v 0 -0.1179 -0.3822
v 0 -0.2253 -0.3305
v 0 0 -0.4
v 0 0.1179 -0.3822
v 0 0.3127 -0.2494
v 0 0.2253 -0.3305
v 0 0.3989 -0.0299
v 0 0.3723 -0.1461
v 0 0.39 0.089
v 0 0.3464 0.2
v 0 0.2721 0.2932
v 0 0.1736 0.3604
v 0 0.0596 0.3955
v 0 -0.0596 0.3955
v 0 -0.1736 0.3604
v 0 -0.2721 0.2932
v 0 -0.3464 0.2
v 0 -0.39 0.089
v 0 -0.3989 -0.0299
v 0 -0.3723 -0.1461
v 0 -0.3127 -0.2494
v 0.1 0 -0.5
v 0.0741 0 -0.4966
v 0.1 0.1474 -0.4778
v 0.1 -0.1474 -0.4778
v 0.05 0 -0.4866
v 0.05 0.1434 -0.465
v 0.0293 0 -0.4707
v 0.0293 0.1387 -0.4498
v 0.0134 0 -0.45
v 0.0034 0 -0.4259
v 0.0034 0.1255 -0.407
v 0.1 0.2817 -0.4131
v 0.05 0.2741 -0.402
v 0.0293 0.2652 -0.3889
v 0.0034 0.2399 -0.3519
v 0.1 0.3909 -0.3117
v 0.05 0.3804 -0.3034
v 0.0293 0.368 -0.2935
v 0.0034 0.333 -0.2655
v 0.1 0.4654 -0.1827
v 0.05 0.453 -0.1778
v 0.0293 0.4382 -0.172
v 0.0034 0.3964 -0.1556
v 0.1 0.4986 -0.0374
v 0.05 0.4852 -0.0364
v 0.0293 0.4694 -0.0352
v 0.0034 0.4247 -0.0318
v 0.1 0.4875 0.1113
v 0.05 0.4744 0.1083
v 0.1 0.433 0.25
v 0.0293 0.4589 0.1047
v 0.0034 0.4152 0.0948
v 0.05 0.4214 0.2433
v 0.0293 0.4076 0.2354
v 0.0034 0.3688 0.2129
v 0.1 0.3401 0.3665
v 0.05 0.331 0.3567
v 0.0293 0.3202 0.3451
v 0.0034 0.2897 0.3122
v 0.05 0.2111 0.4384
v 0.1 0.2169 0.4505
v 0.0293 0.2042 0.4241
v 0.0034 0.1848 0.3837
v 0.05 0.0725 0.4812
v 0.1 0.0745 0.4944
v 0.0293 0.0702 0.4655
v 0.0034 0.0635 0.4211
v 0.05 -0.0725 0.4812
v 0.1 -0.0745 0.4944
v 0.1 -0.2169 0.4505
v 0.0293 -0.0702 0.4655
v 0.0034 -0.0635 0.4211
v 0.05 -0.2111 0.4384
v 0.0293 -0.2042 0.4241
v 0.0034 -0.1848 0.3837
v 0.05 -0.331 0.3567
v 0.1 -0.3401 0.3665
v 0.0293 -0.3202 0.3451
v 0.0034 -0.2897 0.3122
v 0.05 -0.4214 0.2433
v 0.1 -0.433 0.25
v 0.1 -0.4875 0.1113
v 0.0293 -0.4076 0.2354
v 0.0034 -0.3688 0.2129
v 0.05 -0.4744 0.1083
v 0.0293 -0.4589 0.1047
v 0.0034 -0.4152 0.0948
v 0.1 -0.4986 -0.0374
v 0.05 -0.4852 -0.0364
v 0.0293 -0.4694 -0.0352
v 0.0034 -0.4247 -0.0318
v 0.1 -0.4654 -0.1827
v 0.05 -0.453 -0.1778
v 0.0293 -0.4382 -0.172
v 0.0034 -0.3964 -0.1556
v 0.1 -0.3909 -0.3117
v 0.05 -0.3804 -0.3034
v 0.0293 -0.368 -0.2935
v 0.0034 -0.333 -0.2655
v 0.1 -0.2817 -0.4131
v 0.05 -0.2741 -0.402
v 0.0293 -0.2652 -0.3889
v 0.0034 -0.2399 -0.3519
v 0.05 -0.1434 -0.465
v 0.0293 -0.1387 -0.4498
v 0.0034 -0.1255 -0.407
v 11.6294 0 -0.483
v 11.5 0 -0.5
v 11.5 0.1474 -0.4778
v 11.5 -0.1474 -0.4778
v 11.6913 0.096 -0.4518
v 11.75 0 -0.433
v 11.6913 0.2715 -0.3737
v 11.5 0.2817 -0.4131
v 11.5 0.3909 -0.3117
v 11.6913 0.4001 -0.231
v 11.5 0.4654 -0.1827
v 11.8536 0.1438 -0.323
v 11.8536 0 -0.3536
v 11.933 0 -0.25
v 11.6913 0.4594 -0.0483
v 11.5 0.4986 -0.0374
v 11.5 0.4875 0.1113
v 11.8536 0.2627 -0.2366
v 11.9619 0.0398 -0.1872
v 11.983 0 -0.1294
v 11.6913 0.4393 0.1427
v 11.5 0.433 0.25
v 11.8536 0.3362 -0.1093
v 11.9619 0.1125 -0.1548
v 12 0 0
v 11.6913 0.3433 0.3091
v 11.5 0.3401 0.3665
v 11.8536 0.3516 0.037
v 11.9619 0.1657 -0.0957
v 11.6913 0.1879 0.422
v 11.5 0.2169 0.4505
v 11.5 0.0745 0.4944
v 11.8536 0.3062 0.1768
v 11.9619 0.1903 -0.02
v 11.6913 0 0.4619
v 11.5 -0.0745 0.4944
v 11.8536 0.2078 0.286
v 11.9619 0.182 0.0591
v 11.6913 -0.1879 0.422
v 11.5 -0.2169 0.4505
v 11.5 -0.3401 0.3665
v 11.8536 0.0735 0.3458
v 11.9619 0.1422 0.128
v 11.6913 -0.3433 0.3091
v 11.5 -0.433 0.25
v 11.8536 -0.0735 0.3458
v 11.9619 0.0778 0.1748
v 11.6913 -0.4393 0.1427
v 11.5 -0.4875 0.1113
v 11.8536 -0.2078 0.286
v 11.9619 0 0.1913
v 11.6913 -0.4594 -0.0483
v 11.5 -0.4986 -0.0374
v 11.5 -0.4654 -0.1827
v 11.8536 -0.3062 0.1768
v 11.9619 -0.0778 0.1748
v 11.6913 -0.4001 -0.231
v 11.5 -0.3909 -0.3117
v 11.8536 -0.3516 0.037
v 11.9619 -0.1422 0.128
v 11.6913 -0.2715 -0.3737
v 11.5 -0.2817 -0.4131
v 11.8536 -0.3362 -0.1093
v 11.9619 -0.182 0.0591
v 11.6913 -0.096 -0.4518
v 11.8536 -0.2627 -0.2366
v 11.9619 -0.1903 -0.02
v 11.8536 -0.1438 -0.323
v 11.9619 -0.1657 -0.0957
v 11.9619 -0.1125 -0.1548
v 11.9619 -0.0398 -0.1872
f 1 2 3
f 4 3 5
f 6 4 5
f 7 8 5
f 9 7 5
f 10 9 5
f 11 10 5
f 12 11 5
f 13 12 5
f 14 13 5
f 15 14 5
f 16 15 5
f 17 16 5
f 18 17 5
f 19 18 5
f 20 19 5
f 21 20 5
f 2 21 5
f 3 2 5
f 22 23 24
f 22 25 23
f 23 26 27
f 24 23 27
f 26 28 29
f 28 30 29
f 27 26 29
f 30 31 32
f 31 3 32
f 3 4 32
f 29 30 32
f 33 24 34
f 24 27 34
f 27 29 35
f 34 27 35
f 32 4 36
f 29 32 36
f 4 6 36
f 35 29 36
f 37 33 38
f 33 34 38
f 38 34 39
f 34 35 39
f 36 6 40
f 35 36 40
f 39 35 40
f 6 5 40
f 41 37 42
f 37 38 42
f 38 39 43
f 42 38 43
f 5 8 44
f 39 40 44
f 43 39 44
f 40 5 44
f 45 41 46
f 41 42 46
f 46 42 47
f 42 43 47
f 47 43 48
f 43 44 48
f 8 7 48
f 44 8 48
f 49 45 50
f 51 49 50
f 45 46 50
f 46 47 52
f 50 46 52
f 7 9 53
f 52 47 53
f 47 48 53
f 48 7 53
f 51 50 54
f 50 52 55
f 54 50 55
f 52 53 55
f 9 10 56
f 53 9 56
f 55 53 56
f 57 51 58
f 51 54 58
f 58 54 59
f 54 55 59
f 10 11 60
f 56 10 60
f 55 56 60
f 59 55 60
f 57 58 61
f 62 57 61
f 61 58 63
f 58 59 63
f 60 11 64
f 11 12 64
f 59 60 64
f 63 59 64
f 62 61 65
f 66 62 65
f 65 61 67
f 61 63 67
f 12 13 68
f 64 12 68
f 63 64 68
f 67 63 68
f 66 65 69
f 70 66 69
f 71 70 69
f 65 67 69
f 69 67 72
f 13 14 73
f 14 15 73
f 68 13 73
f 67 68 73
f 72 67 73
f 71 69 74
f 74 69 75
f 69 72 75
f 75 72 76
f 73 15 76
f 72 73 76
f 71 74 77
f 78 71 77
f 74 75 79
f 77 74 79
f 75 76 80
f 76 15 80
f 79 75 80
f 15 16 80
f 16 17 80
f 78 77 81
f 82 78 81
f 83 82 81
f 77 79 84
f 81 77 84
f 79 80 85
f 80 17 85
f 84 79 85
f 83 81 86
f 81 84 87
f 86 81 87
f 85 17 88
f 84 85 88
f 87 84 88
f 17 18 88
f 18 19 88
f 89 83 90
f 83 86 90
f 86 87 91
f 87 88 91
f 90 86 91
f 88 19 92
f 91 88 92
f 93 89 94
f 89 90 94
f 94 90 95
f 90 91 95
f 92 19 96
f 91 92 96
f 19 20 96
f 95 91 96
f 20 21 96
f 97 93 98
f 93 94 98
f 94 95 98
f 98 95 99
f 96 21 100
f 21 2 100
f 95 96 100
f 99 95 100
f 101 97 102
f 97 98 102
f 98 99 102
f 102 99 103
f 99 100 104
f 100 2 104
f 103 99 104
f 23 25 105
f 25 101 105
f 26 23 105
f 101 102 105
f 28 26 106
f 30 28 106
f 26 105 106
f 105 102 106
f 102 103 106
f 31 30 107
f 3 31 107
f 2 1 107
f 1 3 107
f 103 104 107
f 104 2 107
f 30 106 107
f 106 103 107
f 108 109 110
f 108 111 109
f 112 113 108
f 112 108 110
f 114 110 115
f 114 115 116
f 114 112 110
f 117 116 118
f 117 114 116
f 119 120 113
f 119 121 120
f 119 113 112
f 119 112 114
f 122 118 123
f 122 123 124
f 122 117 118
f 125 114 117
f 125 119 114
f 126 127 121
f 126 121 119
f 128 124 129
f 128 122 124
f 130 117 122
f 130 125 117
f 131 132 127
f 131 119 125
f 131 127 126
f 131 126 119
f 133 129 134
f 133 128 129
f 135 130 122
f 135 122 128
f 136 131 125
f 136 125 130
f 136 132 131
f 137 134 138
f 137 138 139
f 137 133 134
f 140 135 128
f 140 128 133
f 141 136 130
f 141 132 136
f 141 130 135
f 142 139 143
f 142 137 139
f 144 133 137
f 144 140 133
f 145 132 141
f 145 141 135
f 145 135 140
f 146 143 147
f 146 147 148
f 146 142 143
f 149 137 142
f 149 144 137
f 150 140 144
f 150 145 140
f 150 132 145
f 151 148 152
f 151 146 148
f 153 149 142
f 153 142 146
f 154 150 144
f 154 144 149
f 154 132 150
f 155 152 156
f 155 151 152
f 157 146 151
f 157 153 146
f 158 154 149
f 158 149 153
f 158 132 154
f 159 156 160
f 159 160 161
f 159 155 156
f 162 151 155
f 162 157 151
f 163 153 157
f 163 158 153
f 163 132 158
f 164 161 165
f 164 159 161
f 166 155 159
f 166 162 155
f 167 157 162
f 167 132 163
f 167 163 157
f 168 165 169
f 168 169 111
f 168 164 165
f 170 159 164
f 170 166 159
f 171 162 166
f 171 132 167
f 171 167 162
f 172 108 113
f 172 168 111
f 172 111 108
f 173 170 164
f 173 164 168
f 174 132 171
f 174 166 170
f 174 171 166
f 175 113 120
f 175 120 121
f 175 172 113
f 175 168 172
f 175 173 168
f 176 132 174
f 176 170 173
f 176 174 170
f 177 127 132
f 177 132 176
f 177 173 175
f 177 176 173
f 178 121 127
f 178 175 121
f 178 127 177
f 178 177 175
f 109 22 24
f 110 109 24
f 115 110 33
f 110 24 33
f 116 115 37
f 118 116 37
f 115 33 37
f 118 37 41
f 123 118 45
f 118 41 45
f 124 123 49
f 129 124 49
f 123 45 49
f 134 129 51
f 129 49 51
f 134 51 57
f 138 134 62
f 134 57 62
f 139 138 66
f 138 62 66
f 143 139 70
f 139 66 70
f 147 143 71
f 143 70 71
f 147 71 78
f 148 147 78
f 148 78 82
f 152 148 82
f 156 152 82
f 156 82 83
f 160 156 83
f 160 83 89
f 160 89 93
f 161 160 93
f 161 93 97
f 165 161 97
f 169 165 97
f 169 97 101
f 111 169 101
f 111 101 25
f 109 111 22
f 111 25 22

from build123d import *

# Parameters (mm, degrees)
ESBO_O1_R                = 0.5
RESSALTO_EXTRUS_O1_DEPTH = 12
FILETE5_R                = 0.5
FILETE6_R                = 0.1


with BuildPart() as part:
    # Esboço1 → Ressalto-extrusão1 (new body)
    with BuildSketch(Plane(origin=(0, 0, 0), x_dir=(0, 0, -1), z_dir=(1, 0, 0))):
        Circle(ESBO_O1_R)
    extrude(amount=RESSALTO_EXTRUS_O1_DEPTH)

    # Filete5
    filete5_edges = [part.edges().sort_by_distance(p)[0] for p in [
        (12, 0, 0.5),
    ]]
    fillet(filete5_edges, radius=FILETE5_R)

    # Filete6
    filete6_edges = [part.edges().sort_by_distance(p)[0] for p in [
        (0, 0, 0.5),
    ]]
    fillet(filete6_edges, radius=FILETE6_R)


solid = part.part
